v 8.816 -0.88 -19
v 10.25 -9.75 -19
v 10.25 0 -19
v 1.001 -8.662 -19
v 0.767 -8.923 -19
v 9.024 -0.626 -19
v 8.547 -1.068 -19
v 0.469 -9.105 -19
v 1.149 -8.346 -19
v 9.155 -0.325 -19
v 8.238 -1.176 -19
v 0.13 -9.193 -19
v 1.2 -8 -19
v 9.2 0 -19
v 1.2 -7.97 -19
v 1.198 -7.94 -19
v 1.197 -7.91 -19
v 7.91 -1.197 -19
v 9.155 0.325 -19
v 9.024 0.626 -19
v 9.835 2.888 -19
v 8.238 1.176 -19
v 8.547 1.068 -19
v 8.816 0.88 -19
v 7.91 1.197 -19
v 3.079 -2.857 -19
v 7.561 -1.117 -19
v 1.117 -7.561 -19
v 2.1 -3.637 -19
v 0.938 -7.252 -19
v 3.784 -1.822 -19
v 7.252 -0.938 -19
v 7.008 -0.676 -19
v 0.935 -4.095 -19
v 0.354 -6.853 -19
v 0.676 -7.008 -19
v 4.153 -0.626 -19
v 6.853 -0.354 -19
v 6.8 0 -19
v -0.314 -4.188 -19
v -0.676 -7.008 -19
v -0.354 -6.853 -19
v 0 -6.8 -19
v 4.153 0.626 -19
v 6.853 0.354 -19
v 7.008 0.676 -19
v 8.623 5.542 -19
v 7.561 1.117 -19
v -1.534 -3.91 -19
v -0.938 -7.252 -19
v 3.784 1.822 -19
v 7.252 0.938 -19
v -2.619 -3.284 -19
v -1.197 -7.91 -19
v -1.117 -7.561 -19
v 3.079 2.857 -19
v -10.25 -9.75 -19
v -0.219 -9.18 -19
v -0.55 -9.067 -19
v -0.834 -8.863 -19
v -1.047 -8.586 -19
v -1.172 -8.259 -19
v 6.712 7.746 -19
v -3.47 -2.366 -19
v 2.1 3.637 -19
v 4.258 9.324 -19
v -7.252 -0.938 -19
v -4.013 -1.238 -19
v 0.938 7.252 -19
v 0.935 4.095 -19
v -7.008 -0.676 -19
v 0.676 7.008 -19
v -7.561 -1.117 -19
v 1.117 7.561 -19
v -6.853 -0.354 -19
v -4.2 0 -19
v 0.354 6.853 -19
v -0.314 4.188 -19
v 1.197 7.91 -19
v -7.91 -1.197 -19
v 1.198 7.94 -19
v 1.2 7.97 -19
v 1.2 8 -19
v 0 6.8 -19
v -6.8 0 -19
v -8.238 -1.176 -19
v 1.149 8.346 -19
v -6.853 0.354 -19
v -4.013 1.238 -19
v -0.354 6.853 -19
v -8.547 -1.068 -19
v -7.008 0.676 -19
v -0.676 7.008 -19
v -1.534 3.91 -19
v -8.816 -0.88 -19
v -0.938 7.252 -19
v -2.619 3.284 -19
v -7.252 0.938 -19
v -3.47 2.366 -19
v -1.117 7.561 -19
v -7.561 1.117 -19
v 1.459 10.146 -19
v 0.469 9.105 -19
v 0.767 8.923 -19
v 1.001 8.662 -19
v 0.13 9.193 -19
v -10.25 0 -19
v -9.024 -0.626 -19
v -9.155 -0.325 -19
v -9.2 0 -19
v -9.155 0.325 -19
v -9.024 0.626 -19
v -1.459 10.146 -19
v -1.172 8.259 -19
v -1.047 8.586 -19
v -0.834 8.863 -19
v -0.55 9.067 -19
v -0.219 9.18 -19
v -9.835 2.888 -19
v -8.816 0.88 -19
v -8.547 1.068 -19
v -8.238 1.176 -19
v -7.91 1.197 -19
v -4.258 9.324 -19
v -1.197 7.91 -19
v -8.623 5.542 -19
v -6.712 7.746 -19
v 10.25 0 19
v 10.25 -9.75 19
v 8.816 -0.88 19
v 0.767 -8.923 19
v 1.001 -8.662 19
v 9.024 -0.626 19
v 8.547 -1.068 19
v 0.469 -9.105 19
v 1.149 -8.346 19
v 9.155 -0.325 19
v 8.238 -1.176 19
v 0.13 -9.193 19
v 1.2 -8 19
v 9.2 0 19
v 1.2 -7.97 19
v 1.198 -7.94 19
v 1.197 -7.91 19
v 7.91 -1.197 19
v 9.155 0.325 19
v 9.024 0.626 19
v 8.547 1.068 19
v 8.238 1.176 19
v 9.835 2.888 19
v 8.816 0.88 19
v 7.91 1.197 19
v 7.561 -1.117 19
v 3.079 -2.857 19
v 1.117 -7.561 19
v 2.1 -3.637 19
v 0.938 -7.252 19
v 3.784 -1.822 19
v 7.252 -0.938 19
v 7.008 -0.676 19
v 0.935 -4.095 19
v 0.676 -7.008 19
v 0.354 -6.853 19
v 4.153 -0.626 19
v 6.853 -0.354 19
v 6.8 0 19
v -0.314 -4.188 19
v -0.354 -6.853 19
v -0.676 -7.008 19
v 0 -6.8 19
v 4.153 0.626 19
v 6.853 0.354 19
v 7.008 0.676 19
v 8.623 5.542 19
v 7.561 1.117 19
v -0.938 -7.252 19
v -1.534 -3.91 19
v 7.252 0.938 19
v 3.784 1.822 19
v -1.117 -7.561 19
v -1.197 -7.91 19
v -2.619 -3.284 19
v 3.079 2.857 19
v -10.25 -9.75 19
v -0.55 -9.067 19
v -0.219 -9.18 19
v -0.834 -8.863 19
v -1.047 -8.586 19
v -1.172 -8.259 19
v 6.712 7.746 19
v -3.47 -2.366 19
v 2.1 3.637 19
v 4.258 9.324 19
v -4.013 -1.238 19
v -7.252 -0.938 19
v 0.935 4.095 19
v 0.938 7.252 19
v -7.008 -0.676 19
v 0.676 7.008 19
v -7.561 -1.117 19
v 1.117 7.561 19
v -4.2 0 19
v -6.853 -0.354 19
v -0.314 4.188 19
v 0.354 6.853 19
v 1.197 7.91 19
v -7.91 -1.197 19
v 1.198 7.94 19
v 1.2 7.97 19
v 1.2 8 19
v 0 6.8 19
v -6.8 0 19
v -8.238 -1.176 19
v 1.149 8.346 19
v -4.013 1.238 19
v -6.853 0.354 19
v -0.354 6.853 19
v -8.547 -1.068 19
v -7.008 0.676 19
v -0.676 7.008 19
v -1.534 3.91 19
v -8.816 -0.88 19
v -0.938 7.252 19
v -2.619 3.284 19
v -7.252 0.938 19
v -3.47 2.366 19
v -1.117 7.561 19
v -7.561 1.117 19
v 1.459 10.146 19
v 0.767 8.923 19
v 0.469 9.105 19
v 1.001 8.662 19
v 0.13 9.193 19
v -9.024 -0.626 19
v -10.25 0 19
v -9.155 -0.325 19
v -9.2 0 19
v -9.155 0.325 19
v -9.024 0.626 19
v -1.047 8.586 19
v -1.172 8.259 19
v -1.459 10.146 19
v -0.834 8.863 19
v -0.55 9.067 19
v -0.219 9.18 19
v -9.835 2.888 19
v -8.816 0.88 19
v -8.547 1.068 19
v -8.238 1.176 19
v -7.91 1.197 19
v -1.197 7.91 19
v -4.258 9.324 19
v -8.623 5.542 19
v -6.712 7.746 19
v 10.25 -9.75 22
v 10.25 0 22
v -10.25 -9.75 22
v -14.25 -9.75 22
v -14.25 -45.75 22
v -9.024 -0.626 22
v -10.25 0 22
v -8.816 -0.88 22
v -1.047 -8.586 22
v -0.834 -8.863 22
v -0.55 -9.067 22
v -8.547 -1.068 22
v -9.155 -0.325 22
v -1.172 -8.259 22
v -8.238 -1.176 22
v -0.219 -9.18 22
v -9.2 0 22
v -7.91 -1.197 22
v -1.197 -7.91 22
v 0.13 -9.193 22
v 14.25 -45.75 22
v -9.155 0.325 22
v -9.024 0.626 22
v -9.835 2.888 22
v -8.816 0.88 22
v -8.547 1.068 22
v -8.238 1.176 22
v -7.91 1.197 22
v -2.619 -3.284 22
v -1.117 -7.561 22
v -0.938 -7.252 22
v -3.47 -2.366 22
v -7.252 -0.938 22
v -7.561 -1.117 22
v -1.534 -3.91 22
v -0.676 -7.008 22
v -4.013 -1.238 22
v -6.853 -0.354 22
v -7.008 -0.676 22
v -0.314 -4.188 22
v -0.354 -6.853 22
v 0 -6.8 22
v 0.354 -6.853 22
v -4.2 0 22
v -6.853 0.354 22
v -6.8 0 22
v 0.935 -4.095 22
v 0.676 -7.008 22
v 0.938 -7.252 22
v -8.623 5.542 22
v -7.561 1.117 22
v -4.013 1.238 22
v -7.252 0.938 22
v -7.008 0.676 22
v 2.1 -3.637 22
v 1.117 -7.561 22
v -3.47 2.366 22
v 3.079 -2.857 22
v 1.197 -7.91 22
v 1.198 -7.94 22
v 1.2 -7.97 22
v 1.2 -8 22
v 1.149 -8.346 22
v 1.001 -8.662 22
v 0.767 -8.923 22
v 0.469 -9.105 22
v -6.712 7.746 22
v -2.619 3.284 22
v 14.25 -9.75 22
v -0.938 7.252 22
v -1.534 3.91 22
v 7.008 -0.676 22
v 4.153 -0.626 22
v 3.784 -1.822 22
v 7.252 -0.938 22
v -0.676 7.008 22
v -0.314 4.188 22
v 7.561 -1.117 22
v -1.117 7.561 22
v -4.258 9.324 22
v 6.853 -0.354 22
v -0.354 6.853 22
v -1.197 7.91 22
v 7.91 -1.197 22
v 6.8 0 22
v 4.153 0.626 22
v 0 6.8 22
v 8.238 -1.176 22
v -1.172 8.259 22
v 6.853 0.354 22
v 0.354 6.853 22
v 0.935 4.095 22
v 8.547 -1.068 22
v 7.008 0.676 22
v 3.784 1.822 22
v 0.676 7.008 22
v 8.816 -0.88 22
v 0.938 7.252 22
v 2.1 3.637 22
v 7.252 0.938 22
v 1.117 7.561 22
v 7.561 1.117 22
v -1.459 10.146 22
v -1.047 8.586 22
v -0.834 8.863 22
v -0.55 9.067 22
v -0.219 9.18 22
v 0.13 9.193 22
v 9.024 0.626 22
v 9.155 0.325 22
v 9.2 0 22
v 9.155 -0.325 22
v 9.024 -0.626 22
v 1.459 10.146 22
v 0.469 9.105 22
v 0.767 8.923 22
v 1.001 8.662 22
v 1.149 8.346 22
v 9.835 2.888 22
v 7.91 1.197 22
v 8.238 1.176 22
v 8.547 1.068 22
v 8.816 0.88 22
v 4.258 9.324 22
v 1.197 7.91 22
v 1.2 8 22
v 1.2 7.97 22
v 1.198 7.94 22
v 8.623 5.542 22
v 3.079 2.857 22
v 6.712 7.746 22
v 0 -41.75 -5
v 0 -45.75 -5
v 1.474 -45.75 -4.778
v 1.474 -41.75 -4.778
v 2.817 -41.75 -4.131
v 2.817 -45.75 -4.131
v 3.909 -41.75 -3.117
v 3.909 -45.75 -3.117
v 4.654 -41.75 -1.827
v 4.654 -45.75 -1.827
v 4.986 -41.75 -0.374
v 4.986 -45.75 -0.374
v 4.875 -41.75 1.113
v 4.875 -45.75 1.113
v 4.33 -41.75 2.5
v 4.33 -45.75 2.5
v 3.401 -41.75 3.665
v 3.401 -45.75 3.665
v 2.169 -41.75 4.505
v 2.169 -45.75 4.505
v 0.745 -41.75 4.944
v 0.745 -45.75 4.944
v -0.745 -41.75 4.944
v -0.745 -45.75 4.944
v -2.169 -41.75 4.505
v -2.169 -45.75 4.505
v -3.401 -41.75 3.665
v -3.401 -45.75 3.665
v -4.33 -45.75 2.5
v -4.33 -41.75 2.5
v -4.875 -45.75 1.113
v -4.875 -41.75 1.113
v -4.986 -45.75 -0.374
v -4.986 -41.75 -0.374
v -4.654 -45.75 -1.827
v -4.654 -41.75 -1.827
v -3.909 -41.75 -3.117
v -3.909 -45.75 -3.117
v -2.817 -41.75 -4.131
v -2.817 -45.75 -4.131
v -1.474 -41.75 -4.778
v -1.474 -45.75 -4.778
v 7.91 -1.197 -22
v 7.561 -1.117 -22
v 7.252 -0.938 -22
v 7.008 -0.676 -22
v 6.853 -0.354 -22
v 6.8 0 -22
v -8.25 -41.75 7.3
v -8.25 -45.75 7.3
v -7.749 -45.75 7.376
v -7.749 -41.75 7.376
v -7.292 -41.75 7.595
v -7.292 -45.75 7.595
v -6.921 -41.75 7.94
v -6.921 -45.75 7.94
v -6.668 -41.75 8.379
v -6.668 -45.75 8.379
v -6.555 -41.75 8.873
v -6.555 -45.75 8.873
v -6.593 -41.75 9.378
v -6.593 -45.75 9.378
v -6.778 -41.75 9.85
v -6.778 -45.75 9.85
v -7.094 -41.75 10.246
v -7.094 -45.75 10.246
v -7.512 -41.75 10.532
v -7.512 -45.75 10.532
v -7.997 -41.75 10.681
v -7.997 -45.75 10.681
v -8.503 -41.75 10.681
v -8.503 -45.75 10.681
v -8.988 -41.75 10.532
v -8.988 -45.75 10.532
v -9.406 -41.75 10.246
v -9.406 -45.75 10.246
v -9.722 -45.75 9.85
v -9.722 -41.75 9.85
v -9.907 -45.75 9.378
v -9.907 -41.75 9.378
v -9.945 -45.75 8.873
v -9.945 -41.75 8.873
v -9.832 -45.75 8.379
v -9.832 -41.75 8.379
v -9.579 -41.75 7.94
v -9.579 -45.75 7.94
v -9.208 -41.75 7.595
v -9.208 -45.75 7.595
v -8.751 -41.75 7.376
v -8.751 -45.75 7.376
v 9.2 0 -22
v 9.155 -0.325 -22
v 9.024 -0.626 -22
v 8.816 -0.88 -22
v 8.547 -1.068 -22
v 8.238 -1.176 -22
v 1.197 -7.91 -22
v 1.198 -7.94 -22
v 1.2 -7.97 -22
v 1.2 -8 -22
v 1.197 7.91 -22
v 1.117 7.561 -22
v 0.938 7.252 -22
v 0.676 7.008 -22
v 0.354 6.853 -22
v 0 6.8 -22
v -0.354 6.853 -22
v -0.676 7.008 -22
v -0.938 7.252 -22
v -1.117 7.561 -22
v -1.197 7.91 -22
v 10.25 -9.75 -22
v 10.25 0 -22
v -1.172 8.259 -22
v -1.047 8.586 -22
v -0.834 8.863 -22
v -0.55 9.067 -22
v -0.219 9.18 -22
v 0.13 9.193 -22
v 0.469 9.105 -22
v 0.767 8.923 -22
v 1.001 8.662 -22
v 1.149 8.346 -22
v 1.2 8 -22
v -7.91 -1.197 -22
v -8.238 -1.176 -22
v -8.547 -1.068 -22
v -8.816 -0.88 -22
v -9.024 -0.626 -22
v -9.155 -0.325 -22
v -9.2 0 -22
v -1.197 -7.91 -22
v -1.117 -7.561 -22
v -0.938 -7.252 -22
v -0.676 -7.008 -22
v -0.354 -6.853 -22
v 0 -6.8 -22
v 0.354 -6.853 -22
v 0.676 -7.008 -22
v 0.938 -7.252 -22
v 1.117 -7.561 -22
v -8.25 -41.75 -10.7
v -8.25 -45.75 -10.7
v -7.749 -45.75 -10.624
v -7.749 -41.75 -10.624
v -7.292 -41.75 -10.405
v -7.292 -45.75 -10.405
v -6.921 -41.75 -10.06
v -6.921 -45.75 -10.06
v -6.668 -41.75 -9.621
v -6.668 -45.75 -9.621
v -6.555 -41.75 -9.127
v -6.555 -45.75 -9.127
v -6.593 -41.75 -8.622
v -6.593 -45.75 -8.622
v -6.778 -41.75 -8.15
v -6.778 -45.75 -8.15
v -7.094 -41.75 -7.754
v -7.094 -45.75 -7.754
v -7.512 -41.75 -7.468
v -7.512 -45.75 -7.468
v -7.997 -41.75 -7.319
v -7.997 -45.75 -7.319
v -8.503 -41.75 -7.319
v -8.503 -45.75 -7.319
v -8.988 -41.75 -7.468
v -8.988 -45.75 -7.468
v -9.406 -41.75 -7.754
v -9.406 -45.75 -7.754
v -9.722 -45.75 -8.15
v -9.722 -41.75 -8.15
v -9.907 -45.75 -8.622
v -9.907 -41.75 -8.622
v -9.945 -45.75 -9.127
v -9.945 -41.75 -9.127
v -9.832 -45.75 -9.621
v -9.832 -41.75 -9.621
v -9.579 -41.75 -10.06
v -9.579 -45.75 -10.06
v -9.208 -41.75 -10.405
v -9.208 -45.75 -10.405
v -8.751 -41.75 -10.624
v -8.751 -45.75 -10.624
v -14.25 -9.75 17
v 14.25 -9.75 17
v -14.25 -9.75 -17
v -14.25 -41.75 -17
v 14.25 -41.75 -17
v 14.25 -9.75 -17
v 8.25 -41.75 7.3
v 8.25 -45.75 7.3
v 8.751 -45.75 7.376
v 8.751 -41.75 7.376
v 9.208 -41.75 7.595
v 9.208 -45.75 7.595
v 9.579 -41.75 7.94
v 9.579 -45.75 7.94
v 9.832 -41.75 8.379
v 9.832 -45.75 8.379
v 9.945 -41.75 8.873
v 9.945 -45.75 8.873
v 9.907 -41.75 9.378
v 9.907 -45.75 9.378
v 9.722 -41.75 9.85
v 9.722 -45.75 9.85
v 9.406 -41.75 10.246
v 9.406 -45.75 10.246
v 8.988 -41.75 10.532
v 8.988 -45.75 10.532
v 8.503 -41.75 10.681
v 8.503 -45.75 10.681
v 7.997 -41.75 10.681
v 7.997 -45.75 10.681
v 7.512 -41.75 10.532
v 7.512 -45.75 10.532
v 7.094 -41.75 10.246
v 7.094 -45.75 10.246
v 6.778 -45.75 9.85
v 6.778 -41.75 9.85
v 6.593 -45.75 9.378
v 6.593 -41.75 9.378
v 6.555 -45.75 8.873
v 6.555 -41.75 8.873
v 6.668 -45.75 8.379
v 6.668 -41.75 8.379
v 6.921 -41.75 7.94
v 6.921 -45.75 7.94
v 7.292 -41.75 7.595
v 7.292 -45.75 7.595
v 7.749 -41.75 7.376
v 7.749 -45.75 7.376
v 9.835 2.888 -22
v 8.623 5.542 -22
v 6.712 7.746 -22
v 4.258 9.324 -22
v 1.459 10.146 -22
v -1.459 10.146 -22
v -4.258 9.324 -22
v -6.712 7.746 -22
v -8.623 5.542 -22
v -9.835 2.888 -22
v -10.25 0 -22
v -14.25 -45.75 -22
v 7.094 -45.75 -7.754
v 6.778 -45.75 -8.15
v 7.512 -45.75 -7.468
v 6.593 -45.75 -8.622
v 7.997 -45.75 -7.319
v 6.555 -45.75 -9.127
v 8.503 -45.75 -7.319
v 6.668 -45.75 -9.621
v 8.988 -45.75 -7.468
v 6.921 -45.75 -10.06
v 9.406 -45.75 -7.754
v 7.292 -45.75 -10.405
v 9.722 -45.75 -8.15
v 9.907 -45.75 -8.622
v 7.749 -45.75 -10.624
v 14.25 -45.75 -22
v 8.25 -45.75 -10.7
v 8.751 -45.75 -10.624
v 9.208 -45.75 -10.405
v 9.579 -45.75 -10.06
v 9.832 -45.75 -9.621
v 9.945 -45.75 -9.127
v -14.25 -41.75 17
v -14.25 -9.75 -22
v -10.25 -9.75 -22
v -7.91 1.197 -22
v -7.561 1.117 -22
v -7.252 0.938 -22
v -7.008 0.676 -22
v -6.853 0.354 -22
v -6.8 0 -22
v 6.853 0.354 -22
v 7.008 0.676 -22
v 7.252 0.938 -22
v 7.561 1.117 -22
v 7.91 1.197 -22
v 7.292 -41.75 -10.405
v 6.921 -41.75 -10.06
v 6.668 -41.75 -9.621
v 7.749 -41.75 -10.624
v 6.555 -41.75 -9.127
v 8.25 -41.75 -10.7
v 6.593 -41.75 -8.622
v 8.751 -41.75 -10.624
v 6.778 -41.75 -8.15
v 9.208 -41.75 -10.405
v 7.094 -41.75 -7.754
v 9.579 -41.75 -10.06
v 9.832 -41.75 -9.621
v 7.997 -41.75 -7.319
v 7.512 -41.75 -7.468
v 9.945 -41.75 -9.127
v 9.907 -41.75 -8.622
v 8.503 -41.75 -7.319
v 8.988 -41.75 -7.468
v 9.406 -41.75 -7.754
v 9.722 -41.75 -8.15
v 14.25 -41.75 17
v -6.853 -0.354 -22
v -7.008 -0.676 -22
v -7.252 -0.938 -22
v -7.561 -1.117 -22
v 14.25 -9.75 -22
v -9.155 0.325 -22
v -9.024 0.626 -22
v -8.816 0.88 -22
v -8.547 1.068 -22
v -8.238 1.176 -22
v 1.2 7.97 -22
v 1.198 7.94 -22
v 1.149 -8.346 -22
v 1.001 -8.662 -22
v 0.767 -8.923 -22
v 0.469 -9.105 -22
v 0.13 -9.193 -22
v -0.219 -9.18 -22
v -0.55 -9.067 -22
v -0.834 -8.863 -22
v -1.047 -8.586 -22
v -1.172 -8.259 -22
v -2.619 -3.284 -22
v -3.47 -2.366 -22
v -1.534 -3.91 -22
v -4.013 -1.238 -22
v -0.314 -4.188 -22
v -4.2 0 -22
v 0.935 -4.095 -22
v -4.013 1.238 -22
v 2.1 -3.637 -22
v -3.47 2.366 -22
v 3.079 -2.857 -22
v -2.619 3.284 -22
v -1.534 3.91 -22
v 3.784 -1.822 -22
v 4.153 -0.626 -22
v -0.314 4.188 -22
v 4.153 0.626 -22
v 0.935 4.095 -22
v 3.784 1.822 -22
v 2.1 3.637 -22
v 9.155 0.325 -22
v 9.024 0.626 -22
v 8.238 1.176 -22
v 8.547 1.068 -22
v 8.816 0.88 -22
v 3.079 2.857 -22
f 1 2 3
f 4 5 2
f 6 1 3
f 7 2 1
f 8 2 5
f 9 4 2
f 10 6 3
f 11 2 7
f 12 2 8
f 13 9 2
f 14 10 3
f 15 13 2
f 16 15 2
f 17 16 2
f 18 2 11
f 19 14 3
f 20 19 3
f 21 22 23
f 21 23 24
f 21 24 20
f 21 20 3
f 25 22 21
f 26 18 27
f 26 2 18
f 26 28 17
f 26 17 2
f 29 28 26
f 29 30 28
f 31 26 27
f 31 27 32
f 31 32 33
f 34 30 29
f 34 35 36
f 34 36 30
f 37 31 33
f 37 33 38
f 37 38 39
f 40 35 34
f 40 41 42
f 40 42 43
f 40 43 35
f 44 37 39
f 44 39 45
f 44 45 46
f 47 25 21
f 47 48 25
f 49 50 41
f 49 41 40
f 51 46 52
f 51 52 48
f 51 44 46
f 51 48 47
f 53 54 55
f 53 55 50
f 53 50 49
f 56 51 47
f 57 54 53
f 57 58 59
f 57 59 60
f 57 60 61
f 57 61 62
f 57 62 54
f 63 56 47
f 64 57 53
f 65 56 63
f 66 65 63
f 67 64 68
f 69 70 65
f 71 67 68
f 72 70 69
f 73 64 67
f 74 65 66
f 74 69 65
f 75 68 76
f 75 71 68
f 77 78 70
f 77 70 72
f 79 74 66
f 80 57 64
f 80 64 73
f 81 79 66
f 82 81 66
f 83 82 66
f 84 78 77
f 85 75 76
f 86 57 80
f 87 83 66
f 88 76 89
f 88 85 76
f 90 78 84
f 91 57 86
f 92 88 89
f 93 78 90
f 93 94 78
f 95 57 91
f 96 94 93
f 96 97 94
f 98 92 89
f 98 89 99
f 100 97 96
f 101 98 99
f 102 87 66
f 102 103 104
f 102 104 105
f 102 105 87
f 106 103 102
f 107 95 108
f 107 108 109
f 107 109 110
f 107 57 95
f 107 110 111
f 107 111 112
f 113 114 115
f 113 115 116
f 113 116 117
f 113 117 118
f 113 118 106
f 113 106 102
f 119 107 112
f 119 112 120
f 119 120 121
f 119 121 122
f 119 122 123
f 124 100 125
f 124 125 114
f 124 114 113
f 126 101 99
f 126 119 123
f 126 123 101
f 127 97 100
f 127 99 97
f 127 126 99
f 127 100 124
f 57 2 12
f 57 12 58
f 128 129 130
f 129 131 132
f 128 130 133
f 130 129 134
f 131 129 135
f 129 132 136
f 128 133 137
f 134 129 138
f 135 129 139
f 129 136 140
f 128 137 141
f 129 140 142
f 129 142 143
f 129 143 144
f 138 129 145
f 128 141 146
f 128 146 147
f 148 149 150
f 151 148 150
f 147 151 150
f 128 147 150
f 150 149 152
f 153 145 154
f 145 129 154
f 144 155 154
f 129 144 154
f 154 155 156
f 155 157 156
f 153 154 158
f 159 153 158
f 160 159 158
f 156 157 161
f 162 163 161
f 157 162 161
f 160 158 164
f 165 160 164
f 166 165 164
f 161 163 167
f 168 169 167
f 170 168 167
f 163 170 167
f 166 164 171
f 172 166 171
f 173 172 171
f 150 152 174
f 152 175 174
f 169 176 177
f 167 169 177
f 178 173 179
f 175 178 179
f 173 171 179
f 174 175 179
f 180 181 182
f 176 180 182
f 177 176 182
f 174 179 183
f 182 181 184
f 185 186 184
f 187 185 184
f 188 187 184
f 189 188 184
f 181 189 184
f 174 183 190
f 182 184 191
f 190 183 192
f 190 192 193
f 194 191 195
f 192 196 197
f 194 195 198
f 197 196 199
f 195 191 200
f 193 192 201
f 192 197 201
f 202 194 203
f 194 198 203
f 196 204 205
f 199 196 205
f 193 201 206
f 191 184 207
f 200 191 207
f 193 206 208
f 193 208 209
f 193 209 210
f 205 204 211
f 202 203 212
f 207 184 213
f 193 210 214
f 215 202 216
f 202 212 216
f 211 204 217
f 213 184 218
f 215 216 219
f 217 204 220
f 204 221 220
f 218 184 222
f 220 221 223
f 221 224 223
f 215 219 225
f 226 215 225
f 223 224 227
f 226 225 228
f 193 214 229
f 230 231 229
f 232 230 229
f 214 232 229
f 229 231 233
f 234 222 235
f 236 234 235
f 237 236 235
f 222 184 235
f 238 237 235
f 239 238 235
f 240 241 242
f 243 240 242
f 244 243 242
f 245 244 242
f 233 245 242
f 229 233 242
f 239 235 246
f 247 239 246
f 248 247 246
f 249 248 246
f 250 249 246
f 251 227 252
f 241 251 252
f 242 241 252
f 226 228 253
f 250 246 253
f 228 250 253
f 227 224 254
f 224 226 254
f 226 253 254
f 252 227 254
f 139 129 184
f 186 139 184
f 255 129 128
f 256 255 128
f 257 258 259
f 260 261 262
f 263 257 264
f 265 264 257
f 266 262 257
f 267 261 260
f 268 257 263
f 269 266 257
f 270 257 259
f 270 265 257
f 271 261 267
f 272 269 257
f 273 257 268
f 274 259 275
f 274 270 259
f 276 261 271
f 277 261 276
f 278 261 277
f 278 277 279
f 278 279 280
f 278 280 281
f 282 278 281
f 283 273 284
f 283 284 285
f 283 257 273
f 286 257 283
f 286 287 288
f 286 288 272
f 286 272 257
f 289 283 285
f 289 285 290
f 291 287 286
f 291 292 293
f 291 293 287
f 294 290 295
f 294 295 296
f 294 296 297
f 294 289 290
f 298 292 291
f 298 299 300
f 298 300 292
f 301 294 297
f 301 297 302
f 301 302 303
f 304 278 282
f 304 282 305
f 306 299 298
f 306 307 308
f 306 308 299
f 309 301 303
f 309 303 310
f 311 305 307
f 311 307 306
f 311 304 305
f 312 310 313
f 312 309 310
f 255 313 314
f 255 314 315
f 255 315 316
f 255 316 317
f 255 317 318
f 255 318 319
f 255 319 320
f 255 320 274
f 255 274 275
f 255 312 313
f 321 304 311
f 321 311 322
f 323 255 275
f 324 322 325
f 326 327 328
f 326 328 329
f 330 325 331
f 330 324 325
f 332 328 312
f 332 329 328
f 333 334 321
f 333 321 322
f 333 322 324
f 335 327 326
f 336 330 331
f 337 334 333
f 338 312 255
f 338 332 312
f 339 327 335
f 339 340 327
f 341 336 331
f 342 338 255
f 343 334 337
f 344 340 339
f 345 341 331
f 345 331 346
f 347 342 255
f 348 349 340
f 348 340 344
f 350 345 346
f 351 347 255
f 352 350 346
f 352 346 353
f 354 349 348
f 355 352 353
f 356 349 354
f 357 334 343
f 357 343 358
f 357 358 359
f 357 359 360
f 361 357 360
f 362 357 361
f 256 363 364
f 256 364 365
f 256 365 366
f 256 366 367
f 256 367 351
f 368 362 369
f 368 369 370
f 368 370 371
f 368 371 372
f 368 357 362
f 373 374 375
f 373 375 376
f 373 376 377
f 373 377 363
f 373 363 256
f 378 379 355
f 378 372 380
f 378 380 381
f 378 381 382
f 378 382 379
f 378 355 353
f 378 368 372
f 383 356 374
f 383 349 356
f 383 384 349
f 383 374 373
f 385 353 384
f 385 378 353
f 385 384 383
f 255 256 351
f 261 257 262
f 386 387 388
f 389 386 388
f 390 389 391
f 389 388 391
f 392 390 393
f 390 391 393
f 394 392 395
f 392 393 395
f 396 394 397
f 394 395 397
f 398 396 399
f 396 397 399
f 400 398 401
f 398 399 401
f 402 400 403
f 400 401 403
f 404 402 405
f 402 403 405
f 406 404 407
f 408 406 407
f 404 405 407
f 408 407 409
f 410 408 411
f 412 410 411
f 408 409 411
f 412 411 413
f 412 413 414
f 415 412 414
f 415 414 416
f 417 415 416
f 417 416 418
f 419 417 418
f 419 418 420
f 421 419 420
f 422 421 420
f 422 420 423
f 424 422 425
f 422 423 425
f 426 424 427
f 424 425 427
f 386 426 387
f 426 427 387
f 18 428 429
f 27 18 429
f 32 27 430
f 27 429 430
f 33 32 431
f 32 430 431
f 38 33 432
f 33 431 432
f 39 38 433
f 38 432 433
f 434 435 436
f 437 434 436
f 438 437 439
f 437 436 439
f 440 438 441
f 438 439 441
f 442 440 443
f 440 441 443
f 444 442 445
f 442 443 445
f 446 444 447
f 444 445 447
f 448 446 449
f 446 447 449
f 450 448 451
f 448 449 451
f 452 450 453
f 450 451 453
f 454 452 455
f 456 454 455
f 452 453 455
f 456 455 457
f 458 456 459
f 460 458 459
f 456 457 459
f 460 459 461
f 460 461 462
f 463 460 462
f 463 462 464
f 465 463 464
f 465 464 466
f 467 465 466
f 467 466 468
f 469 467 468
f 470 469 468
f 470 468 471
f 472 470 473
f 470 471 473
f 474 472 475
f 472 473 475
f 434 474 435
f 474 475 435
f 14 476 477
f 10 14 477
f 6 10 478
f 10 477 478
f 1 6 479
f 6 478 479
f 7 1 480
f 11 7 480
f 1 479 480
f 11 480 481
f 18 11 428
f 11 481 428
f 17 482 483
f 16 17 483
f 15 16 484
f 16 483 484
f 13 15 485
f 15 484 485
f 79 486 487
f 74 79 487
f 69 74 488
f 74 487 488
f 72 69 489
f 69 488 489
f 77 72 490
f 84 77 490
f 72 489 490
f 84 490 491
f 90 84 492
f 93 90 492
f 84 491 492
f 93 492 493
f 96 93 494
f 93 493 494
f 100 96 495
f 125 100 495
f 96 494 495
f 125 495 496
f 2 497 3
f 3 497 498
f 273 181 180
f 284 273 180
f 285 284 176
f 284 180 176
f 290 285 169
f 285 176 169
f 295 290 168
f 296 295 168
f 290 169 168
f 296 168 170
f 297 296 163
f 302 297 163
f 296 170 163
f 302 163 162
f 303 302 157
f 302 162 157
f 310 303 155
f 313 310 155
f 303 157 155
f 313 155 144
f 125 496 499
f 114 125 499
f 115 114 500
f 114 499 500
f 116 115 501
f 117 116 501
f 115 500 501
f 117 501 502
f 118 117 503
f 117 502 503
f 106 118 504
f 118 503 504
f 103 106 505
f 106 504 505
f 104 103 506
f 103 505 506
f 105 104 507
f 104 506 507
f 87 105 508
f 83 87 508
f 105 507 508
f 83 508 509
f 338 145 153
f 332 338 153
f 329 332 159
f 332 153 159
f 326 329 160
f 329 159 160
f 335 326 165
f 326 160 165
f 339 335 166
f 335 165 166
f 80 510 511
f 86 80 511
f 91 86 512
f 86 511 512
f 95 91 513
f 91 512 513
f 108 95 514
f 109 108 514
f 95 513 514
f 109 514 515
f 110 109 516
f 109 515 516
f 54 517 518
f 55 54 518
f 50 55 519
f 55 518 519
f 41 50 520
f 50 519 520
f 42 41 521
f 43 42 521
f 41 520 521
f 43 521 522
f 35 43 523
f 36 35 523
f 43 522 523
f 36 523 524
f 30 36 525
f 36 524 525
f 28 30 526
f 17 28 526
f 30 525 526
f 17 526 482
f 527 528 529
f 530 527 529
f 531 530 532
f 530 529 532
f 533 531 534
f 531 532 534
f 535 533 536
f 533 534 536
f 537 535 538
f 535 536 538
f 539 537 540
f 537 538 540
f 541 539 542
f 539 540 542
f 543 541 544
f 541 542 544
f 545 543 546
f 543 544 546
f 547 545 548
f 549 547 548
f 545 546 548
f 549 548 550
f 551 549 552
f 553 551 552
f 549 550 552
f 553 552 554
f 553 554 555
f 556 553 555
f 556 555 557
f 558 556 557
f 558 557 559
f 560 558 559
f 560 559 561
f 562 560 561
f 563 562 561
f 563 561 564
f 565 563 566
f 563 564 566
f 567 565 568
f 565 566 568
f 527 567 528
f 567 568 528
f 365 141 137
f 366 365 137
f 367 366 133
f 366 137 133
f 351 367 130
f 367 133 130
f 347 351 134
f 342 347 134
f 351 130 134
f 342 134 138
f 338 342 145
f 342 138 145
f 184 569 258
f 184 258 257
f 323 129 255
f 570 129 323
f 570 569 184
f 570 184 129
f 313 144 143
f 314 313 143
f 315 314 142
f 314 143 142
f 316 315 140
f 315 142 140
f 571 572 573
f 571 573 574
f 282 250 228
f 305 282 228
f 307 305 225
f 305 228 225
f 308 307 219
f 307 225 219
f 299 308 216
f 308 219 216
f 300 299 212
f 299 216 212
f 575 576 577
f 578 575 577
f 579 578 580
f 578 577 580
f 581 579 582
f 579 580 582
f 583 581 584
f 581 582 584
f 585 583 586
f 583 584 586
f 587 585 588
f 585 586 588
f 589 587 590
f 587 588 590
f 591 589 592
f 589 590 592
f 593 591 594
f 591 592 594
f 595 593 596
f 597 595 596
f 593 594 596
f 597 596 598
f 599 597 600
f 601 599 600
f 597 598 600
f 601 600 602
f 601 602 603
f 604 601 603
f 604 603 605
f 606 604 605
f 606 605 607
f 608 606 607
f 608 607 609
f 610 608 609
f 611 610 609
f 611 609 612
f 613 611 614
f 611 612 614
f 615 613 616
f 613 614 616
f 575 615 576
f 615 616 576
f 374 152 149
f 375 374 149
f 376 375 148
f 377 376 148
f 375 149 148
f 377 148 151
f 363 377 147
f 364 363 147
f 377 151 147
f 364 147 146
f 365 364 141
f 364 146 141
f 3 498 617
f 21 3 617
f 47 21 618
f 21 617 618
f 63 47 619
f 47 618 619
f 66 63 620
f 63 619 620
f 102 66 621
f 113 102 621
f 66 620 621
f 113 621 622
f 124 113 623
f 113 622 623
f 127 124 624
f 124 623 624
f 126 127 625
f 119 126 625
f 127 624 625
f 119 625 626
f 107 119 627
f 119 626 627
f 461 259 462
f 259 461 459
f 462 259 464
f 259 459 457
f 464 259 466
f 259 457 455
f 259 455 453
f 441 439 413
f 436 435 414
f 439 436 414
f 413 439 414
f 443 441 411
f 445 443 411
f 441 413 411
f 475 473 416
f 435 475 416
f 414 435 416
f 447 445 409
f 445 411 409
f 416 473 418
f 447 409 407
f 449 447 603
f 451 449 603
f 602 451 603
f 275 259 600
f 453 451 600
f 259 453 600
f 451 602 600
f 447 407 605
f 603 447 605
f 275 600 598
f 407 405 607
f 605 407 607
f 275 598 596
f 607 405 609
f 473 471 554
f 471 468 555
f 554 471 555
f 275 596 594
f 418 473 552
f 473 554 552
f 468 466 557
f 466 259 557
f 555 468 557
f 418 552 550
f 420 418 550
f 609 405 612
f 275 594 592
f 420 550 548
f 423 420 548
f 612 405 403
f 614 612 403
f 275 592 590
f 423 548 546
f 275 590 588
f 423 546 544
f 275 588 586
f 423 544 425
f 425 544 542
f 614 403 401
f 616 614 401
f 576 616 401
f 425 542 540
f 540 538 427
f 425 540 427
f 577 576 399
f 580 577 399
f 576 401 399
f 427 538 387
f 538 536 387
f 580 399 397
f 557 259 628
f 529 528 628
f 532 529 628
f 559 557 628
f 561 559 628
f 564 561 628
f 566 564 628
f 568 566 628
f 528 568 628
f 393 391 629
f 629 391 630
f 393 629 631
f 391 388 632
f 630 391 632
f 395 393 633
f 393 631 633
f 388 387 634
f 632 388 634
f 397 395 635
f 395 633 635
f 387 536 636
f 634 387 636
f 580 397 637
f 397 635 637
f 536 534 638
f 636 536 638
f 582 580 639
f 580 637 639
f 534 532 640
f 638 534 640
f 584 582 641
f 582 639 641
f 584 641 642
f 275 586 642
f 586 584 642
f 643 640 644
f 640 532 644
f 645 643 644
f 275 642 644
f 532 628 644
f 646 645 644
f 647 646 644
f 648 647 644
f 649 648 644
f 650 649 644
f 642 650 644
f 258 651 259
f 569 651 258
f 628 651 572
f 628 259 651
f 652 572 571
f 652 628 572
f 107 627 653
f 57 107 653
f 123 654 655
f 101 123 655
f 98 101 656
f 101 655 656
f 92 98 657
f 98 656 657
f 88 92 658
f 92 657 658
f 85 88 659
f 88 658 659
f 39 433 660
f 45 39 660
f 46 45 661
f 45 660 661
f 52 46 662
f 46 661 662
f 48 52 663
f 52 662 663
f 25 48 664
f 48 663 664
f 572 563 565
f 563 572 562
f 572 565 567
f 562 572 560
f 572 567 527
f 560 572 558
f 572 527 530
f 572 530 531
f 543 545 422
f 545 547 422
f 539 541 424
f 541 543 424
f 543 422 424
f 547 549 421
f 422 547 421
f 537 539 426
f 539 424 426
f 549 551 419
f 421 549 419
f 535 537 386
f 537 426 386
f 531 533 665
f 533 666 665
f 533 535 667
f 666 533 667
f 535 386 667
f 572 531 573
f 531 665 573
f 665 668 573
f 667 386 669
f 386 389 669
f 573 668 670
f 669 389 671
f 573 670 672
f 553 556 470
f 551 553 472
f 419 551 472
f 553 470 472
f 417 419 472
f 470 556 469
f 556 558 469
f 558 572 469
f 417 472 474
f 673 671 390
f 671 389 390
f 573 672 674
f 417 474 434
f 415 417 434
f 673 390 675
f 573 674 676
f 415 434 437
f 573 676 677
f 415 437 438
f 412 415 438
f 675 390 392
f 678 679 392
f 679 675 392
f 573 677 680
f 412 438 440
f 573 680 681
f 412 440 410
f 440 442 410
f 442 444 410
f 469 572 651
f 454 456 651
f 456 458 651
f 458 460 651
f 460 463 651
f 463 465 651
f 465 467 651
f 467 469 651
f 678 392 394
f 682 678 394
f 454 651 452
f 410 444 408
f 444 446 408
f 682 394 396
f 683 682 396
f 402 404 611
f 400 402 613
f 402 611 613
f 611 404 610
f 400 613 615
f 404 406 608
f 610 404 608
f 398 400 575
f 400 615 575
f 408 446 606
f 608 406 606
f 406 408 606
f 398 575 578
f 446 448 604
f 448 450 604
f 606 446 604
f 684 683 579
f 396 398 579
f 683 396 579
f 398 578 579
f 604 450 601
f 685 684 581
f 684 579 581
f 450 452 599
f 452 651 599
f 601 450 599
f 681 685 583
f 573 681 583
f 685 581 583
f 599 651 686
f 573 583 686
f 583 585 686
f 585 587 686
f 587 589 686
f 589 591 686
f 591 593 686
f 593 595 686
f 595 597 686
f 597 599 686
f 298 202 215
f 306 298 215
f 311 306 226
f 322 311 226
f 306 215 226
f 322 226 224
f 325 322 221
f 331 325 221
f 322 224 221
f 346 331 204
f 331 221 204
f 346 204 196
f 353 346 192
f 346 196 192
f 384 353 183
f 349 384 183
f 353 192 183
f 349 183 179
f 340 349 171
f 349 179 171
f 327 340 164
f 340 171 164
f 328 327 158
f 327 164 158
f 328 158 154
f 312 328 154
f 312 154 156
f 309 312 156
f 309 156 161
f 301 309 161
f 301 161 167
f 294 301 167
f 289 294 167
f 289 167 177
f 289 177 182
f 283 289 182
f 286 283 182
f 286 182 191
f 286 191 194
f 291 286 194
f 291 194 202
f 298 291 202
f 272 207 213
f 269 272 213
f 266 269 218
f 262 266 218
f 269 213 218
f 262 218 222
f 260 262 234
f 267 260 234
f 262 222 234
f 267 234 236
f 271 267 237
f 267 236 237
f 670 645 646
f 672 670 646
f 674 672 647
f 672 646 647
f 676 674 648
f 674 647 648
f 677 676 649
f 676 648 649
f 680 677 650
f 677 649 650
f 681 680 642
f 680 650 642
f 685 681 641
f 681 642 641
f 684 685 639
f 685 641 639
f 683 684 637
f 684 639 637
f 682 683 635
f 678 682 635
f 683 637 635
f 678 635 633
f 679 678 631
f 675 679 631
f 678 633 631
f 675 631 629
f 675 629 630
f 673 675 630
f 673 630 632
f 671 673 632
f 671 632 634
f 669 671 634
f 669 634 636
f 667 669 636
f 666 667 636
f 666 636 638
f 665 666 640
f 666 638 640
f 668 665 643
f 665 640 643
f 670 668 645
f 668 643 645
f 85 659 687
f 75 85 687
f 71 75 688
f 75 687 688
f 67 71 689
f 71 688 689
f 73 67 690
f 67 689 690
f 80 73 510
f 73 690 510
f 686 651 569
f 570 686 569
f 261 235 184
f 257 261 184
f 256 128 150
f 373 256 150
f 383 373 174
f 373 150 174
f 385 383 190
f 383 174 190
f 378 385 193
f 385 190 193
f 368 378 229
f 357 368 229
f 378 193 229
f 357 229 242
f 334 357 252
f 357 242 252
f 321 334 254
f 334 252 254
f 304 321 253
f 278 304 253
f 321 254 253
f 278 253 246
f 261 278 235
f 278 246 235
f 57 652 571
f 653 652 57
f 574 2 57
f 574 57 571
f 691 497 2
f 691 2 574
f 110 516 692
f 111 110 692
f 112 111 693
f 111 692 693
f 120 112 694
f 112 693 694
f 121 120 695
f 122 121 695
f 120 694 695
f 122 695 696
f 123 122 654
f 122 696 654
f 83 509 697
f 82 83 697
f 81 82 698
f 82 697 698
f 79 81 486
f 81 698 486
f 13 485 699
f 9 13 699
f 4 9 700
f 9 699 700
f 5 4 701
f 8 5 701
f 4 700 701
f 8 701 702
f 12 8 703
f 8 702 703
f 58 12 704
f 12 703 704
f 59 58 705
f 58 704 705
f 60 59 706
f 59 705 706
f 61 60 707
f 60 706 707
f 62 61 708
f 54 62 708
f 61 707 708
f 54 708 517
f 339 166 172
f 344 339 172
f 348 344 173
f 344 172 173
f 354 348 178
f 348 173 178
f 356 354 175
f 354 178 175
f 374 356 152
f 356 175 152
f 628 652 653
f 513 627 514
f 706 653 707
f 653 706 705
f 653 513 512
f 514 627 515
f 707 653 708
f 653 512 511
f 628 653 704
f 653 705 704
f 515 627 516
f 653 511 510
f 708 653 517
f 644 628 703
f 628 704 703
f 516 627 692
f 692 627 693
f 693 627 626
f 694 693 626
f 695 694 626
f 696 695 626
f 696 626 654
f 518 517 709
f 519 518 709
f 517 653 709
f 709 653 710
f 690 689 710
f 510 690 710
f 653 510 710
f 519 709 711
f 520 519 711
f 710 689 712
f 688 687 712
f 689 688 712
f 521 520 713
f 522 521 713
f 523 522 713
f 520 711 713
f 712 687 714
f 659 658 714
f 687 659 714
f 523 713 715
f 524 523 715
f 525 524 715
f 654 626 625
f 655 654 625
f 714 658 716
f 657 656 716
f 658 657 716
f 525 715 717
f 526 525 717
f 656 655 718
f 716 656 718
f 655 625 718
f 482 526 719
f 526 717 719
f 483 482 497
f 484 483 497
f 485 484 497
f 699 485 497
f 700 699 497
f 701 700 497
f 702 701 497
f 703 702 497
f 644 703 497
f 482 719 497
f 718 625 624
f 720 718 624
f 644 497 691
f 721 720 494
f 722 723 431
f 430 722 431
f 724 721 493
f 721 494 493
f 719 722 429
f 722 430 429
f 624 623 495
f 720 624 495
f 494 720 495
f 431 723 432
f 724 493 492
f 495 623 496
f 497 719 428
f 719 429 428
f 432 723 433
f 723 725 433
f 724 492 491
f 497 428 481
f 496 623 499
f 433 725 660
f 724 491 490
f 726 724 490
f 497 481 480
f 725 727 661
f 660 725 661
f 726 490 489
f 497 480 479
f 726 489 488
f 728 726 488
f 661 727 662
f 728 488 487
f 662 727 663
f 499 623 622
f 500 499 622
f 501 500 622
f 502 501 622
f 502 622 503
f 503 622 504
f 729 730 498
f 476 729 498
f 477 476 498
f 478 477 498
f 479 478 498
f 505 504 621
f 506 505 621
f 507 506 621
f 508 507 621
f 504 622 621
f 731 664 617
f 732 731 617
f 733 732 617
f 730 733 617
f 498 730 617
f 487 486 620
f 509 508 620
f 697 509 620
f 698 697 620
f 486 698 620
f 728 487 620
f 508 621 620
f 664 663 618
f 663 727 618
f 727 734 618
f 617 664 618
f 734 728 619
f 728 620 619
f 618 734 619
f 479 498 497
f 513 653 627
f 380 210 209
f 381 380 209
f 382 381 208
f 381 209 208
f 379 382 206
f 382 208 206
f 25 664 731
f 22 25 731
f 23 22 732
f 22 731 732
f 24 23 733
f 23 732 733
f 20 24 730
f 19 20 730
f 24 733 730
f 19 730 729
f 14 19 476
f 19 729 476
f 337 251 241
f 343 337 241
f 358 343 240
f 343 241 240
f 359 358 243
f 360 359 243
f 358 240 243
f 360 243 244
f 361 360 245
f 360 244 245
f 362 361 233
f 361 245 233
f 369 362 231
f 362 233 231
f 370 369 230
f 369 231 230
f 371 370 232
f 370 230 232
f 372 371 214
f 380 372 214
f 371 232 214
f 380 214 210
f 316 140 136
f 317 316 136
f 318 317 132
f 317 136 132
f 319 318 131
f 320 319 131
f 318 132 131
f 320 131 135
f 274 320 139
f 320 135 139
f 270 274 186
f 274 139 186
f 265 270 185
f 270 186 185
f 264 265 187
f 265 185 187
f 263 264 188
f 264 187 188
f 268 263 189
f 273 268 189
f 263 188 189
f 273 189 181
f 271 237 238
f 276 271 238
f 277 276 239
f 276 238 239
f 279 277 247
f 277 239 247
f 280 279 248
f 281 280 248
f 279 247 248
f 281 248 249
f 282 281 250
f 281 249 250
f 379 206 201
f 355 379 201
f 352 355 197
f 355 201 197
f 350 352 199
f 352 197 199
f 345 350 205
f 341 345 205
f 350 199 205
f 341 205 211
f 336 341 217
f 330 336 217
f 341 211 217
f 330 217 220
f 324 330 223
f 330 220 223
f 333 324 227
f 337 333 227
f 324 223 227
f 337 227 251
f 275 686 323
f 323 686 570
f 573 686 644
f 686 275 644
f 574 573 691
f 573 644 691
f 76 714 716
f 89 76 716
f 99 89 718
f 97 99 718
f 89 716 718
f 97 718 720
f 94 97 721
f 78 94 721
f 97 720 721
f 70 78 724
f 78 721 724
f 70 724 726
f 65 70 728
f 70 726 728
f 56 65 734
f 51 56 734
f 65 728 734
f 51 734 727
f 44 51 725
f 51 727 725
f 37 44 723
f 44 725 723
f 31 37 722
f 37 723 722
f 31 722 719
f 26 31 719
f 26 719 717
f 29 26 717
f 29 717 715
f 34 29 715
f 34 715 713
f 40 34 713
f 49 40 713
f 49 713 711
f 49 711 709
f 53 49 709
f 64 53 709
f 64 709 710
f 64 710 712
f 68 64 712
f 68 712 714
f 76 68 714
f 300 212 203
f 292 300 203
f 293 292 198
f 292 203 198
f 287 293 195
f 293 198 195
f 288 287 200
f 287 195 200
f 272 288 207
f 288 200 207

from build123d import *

# Parameters (mm, degrees)
BOSS_EXTRUDE1_DEPTH      = 22
BOSS_EXTRUDE1_DEPTH_BACK = 22
SKETCH1_R                = 1.2
SKETCH1_R_2              = 4.2
SKETCH2_W                = 38
SKETCH2_H                = 20
CUT_EXTRUDE1_DEPTH       = 105.423416914
SKETCH3_W                = 7
SKETCH3_H                = 44
BOSS_EXTRUDE2_DEPTH      = 36
SKETCH5_W                = 34
SKETCH5_H                = 50
CUT_EXTRUDE3_DEPTH       = 109.047443283
SKETCH6_W                = 20.5
SKETCH6_H                = 54.25
CUT_EXTRUDE4_DEPTH       = 111.605436123
SKETCH20_W               = 28.5
SKETCH20_H               = 34
SKETCH20_R               = 1.7
SKETCH20_R_2             = 5
BOSS_EXTRUDE5_DEPTH      = 4
SKETCH21_W               = 3
SKETCH21_H               = 36
CUT_EXTRUDE12_DEPTH      = 66.777085676


with BuildPart() as part:
    # Sketch1 → Boss-Extrude1 (new, two sides: drawn at the far end of the back side and taken through both)
    with BuildSketch(Plane.XY.offset(-BOSS_EXTRUDE1_DEPTH_BACK)):
        with BuildLine():
            ThreePointArc((10.25, 0), (0, 10.25), (-10.25, 0))
            Line((-10.25, 0), (-10.25, -100))
            Line((-10.25, -100), (10.25, -100))
            Line((10.25, -100), (10.25, 0))
        make_face()
        with Locations((8, 0)):
            Circle(SKETCH1_R, mode=Mode.SUBTRACT)
        with Locations((0, 8)):
            Circle(SKETCH1_R, mode=Mode.SUBTRACT)
        with Locations((-8, 0)):
            Circle(SKETCH1_R, mode=Mode.SUBTRACT)
        Circle(SKETCH1_R_2, mode=Mode.SUBTRACT)
        with Locations((0, -8)):
            Circle(SKETCH1_R, mode=Mode.SUBTRACT)
    extrude(amount=BOSS_EXTRUDE1_DEPTH + BOSS_EXTRUDE1_DEPTH_BACK)

    # Sketch2 → Cut-Extrude1 (cut, through all)
    with BuildSketch(Plane.ZY.offset(10.25)):
        with Locations((0, 0.25)):
            Rectangle(SKETCH2_W, SKETCH2_H)
    extrude(amount=-CUT_EXTRUDE1_DEPTH, mode=Mode.SUBTRACT)

    # Sketch3 → Boss-Extrude2 (add)
    with BuildSketch(Plane(origin=(0, -9.75, 0), x_dir=(1, 0, 0), z_dir=(0, 1, 0))):
        with Locations((-13.75, 0)):
            Rectangle(SKETCH3_W, SKETCH3_H)
        with Locations((13.75, 0)):
            Rectangle(SKETCH3_W, SKETCH3_H)
    extrude(amount=-BOSS_EXTRUDE2_DEPTH)

    # Sketch5 → Cut-Extrude3 (cut, through all)
    with BuildSketch(Plane.ZY.offset(17.25)):
        with Locations((0, -34.75)):
            Rectangle(SKETCH5_W, SKETCH5_H)
    extrude(amount=-CUT_EXTRUDE3_DEPTH, mode=Mode.SUBTRACT)

    # Sketch6 → Cut-Extrude4 (cut, through all)
    with BuildSketch(Plane.XY.offset(22)):
        with Locations((0, -72.875)):
            Rectangle(SKETCH6_W, SKETCH6_H)
    extrude(amount=-CUT_EXTRUDE4_DEPTH, mode=Mode.SUBTRACT)


with BuildPart() as cut_extrude4_piece_1:
    # of the separate pieces the step leaves, piece 1, a body of its own (cut_extrude4_pieces)
    add(part.part.solids().sort_by_distance((17.25, -45.75, -17))[0])



with BuildPart() as cut_extrude4_piece_2:
    # of the separate pieces the step leaves, piece 2, a body of its own (cut_extrude4_pieces)
    add(part.part.solids().sort_by_distance((-10.25, 0, 22))[0])


with BuildPart() as cut_extrude4_piece_1_1:
    add(cut_extrude4_piece_1.part)

    add(cut_extrude4_piece_2.part)  # Boss-Extrude5 merges Cut-Extrude4 piece 2
    # Sketch20 → Boss-Extrude5 (add)
    with BuildSketch(Plane.XZ.offset(45.75)):
        Rectangle(SKETCH20_W, SKETCH20_H)
        with Locations((-8.25, -9)):
            Circle(SKETCH20_R, mode=Mode.SUBTRACT)
        with Locations((8.25, -9)):
            Circle(SKETCH20_R, mode=Mode.SUBTRACT)
        with Locations((-8.25, 9)):
            Circle(SKETCH20_R, mode=Mode.SUBTRACT)
        Circle(SKETCH20_R_2, mode=Mode.SUBTRACT)
        with Locations((8.25, 9)):
            Circle(SKETCH20_R, mode=Mode.SUBTRACT)
    extrude(amount=-BOSS_EXTRUDE5_DEPTH)

    # Sketch21 → Cut-Extrude12 (cut, through all)
    with BuildSketch(Plane(origin=(0, 0, -22), x_dir=(-1, 0, 0), z_dir=(0, 0, -1))):
        with Locations((-15.75, -27.75)):
            Rectangle(SKETCH21_W, SKETCH21_H)
        with Locations((15.75, -27.75)):
            Rectangle(SKETCH21_W, SKETCH21_H)
    extrude(amount=-CUT_EXTRUDE12_DEPTH, mode=Mode.SUBTRACT)


solid = cut_extrude4_piece_1_1.part
